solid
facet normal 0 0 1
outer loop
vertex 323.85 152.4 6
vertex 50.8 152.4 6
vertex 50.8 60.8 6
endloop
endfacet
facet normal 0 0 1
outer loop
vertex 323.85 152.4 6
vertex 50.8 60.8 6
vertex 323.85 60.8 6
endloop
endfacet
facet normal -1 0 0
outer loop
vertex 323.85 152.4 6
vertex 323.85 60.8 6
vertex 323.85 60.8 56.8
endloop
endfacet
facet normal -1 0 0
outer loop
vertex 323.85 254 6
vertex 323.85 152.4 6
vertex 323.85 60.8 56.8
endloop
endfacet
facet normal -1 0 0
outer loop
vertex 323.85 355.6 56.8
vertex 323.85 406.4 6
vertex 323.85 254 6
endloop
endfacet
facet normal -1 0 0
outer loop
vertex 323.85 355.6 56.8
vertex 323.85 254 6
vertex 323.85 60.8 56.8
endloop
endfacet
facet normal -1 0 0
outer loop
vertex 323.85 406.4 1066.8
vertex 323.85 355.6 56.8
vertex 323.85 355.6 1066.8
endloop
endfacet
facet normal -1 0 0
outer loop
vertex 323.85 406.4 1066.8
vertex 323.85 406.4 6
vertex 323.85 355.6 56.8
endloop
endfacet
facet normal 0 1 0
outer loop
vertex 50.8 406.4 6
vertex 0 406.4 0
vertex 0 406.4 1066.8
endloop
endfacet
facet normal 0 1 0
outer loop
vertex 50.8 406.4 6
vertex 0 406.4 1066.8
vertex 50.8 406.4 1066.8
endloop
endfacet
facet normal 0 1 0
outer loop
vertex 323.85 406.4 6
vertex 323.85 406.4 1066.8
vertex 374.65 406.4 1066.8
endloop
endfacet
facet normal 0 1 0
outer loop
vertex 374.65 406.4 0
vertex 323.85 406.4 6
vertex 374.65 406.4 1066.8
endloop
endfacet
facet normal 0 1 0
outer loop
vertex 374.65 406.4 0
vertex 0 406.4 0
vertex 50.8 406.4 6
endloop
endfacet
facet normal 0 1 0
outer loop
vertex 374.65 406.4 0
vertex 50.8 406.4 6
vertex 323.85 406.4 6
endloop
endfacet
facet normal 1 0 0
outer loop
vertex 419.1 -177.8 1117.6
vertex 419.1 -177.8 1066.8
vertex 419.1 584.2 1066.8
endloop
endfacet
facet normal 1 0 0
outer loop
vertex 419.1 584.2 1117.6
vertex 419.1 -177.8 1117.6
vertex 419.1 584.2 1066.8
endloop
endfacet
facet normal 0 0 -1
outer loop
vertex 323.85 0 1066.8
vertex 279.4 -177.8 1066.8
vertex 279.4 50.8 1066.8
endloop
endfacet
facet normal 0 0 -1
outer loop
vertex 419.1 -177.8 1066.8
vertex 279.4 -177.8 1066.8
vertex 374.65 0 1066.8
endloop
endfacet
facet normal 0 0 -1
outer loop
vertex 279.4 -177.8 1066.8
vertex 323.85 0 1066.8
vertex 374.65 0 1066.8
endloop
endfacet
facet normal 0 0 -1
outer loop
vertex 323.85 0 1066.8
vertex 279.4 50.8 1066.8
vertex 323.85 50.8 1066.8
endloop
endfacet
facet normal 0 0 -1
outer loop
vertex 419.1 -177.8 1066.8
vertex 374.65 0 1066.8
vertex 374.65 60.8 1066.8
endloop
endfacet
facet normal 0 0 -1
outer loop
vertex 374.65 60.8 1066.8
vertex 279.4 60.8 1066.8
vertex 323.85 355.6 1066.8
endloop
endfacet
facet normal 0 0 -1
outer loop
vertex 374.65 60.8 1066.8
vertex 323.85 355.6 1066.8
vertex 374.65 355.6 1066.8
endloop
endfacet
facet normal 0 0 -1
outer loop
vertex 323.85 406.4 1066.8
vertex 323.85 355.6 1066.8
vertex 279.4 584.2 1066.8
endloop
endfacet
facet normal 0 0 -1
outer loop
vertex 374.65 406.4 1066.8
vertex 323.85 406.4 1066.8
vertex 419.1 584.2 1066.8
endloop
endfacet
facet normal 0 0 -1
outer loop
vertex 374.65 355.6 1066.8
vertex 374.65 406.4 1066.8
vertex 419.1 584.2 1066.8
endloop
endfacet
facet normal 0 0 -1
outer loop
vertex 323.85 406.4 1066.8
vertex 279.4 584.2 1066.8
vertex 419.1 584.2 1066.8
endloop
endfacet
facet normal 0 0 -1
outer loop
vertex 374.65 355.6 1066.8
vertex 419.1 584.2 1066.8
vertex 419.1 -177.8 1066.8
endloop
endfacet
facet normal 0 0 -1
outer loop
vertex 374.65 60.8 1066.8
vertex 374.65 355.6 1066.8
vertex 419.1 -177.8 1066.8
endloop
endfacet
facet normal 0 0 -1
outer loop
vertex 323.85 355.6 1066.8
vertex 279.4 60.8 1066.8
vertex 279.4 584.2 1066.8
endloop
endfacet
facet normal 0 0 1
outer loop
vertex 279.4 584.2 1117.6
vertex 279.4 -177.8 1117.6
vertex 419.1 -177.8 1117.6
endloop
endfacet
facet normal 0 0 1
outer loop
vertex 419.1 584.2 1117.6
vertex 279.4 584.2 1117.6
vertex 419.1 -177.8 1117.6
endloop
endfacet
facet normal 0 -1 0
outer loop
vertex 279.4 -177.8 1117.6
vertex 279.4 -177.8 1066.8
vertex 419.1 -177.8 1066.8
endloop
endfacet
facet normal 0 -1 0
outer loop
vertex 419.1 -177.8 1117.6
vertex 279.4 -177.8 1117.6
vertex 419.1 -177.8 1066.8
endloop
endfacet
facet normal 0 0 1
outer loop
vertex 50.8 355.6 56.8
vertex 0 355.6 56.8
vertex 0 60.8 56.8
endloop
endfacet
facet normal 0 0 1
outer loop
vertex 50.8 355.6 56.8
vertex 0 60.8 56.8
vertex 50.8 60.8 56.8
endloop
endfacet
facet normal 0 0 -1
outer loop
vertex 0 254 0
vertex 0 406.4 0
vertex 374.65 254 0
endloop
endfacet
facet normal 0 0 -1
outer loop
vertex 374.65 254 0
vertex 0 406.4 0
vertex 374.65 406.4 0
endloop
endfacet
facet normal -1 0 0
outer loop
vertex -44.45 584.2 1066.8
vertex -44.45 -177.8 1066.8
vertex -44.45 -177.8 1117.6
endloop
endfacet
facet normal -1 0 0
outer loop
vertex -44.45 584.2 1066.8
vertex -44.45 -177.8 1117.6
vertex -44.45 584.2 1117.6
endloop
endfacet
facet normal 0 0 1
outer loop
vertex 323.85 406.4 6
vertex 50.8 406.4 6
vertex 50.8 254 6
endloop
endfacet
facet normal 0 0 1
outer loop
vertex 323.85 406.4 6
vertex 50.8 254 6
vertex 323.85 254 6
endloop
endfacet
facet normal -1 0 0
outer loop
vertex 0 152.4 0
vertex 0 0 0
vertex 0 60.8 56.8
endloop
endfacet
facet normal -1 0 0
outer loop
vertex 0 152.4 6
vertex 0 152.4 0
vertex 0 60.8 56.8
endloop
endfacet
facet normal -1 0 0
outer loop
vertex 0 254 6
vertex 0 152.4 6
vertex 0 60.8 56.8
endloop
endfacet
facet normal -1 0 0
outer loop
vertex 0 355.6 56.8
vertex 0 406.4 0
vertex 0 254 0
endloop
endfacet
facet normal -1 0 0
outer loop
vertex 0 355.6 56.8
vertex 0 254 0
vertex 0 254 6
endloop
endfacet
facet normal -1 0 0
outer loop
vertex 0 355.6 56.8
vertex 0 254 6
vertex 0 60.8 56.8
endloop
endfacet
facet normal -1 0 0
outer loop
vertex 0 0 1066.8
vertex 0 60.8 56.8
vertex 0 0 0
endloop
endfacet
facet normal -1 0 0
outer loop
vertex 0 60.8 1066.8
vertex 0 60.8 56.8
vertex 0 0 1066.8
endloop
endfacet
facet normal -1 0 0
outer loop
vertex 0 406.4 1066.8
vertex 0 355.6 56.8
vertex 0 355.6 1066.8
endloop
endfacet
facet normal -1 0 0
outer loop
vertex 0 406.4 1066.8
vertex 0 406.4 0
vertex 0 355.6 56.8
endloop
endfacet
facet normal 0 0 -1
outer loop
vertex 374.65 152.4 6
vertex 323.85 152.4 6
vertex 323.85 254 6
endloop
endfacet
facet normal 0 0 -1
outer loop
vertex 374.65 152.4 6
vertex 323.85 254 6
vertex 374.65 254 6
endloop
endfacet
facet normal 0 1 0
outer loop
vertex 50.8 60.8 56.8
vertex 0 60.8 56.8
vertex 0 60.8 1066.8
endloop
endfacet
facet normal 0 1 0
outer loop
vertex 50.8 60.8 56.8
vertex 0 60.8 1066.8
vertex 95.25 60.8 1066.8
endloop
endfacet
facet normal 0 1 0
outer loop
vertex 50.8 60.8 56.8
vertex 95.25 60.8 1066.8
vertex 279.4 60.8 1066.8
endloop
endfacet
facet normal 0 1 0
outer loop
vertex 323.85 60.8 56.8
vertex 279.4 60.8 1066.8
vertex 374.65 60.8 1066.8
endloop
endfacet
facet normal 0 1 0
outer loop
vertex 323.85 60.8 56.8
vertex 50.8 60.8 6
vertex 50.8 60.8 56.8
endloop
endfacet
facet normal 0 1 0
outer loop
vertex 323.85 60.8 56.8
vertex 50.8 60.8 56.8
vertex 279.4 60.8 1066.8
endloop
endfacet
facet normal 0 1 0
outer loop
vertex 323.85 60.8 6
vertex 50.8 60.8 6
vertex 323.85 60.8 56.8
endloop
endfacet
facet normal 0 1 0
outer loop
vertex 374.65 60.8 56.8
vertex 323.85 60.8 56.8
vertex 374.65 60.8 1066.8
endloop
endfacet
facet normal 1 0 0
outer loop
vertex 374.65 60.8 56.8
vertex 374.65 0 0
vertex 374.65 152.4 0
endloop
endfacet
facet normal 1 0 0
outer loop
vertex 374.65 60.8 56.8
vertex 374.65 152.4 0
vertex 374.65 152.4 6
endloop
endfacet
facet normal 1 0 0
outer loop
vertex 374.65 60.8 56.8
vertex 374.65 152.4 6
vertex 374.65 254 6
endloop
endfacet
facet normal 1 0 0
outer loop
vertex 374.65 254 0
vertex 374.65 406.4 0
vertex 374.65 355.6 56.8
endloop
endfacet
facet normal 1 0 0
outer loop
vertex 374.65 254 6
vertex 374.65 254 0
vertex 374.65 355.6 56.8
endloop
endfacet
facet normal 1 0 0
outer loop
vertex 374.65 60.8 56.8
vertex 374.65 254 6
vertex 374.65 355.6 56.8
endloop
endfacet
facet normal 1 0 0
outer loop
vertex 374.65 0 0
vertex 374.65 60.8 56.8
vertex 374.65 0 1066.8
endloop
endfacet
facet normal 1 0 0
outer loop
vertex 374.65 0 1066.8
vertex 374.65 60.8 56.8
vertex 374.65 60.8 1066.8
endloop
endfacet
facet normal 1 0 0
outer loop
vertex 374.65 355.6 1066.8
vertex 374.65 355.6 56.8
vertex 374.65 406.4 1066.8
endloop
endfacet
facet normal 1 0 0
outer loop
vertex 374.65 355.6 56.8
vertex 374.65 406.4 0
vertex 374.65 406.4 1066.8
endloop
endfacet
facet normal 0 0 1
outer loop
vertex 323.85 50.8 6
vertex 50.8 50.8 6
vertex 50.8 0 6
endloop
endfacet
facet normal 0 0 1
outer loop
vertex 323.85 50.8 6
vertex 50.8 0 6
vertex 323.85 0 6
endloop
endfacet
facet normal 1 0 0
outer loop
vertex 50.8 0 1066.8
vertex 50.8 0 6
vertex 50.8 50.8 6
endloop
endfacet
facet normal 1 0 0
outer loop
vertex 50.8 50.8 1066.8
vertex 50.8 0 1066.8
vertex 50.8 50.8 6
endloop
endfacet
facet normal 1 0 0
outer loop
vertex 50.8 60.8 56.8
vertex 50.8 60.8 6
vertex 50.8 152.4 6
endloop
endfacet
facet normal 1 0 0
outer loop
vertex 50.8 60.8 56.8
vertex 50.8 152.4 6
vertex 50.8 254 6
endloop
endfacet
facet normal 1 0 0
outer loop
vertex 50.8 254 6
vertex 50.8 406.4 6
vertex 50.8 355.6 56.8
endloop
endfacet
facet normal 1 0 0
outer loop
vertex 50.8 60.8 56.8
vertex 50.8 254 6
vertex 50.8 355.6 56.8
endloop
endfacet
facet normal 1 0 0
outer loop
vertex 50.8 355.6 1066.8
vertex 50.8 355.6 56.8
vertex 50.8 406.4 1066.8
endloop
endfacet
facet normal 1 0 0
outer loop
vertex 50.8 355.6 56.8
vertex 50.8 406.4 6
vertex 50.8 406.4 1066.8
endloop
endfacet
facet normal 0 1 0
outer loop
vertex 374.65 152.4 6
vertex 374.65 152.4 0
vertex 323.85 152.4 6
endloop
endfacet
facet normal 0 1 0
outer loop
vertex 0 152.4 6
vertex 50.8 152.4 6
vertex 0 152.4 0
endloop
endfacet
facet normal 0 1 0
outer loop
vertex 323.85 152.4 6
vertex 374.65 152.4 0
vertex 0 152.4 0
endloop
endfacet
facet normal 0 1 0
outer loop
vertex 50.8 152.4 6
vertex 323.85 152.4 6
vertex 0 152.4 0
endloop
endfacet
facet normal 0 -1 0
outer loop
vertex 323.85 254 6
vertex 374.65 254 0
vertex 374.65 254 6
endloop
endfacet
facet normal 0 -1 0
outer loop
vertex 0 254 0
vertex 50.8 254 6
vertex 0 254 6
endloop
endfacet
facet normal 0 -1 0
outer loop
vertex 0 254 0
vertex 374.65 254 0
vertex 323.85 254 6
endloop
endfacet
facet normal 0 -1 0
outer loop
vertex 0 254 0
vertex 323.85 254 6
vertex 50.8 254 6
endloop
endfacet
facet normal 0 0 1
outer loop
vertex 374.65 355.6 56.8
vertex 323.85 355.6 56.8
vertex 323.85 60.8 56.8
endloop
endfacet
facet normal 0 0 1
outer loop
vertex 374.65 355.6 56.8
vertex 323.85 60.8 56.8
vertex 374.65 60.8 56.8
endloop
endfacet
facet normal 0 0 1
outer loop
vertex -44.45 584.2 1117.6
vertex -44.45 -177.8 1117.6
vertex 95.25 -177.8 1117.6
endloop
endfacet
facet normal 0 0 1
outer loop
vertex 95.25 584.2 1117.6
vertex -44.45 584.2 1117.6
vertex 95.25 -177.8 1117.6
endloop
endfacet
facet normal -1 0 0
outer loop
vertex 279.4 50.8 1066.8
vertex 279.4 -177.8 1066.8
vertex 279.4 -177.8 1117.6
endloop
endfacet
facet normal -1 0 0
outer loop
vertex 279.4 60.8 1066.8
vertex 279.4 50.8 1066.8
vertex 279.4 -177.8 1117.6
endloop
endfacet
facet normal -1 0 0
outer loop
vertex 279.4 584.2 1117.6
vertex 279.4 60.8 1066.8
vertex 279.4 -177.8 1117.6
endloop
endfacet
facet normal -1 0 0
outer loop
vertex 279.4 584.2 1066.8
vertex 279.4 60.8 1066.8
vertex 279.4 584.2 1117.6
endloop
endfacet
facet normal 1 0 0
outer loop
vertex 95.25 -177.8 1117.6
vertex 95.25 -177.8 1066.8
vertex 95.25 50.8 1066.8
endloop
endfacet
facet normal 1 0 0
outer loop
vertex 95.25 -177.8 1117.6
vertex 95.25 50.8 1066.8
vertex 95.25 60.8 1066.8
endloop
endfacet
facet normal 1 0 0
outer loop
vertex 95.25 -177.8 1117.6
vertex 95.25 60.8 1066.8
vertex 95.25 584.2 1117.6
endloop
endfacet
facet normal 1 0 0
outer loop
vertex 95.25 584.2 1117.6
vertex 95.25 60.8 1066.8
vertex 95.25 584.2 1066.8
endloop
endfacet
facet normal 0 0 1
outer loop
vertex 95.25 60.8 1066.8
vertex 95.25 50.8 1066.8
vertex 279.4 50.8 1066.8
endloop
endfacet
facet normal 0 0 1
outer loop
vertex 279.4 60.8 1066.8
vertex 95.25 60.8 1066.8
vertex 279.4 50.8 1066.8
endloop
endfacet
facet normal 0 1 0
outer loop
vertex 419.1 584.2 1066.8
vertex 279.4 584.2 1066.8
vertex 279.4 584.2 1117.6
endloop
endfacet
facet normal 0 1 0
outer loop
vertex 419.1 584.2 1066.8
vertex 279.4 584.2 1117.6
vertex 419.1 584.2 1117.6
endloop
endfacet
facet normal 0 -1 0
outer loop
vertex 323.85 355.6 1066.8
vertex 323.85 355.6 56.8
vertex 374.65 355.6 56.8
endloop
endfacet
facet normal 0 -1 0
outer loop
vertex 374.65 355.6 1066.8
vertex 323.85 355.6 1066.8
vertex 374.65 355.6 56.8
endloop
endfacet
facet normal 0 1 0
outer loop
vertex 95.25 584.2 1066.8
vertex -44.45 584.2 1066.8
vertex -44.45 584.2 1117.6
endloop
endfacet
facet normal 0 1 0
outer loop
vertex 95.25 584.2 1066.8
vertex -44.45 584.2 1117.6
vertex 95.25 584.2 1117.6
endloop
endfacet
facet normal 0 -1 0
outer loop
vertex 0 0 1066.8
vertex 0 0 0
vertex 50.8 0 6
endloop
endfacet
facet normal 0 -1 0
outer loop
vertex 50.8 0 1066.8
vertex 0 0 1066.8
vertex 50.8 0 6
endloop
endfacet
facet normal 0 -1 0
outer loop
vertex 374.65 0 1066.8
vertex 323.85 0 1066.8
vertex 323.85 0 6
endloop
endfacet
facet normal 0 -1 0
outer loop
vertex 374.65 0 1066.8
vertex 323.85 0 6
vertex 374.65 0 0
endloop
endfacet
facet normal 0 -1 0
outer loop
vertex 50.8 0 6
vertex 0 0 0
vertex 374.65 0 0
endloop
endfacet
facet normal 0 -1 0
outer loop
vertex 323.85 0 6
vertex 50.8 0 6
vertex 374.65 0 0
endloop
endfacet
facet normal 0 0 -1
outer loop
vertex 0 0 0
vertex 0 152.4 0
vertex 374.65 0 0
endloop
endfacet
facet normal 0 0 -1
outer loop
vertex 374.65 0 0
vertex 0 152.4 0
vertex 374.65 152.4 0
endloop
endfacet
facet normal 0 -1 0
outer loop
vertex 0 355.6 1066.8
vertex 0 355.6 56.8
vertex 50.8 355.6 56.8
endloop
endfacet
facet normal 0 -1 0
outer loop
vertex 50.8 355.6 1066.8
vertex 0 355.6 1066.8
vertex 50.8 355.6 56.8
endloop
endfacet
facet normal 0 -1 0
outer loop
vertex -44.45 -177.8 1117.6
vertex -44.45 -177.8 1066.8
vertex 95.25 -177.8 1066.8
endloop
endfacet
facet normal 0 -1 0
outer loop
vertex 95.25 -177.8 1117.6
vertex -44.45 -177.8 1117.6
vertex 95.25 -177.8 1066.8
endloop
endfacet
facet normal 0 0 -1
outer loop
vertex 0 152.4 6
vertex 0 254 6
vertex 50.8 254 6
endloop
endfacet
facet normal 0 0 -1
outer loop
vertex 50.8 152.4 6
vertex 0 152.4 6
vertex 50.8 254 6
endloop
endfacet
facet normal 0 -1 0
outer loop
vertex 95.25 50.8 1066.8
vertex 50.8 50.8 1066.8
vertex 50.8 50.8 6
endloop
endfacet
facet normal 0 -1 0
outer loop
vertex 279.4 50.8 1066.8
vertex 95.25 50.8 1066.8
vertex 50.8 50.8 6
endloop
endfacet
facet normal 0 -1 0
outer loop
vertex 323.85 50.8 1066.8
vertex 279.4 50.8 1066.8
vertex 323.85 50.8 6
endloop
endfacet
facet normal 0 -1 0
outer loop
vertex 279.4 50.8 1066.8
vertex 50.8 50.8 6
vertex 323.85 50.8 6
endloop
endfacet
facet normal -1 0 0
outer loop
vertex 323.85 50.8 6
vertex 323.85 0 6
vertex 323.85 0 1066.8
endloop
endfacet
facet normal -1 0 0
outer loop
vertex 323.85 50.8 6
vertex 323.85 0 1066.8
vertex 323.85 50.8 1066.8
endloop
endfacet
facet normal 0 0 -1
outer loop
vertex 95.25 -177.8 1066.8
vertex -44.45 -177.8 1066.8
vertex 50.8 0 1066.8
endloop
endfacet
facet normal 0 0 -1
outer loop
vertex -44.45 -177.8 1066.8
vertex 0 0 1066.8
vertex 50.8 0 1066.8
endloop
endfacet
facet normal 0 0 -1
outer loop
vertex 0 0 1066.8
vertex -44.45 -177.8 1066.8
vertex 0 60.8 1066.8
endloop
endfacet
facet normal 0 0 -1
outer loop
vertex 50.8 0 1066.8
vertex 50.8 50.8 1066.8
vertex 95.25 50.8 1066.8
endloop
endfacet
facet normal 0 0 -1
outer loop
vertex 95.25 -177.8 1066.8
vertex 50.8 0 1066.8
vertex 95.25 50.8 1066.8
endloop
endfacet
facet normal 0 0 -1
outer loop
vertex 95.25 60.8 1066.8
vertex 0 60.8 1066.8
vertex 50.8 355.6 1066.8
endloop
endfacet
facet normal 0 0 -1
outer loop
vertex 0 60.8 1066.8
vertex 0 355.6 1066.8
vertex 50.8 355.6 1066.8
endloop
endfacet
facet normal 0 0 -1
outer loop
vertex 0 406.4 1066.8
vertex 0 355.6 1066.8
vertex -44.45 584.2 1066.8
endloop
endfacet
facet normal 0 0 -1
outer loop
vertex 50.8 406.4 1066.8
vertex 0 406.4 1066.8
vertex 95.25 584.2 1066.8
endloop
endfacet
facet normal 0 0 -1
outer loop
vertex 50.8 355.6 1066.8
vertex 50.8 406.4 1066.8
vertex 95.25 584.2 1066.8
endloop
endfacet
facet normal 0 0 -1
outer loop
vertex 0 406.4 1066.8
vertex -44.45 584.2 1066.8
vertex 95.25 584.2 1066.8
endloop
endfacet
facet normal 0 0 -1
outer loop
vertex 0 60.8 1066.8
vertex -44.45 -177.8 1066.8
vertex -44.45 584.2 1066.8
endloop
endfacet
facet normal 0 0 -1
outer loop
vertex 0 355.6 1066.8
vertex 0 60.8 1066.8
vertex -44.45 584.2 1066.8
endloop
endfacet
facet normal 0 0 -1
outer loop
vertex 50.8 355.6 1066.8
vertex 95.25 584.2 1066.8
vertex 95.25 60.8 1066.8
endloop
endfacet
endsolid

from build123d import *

# Parameters (mm, degrees)
SKETCH1_W           = 374.65
SKETCH1_H           = 406.4
BOSS_EXTRUDE1_DEPTH = 6
SKETCH1_5_W         = 50.8
SKETCH1_5_H         = 50.8
BOSS_EXTRUDE2_DEPTH = 1066.8
SKETCH3_W           = 139.7
SKETCH3_H           = 762
BOSS_EXTRUDE4_DEPTH = 50.8
SKETCH4_W           = 374.65
SKETCH4_H           = 1060.8
BOSS_EXTRUDE5_DEPTH = 10
SKETCH5_W           = 374.65
SKETCH5_H           = 101.6
CUT_EXTRUDE1_DEPTH  = 10
BOSS_EXTRUDE7_REACH = 1309.36
SKETCH6_W           = 50.8
SKETCH6_H           = 50.8


with BuildPart() as part:
    # Sketch1 → Boss-Extrude1 (new body)
    with BuildSketch(Plane.XY):
        with Locations((187.325, 203.2)):
            Rectangle(SKETCH1_W, SKETCH1_H)
    extrude(amount=BOSS_EXTRUDE1_DEPTH)

    # Sketch1<5> → Boss-Extrude2 (add)
    with BuildSketch(Plane.XY):
        with Locations((25.4, 381)):
            Rectangle(SKETCH1_5_W, SKETCH1_5_H)
        with Locations((25.4, 25.4)):
            Rectangle(SKETCH1_5_W, SKETCH1_5_H)
        with Locations((349.25, 25.4)):
            Rectangle(SKETCH1_5_W, SKETCH1_5_H)
        with Locations((349.25, 381)):
            Rectangle(SKETCH1_5_W, SKETCH1_5_H)
    extrude(amount=BOSS_EXTRUDE2_DEPTH)

    # Sketch3 → Boss-Extrude4 (add)
    with BuildSketch(Plane.XY.offset(1066.8)):
        with Locations((25.4, 203.2)):
            Rectangle(SKETCH3_W, SKETCH3_H)
        with Locations((349.25, 203.2)):
            Rectangle(SKETCH3_W, SKETCH3_H)
    extrude(amount=BOSS_EXTRUDE4_DEPTH)

    # Sketch4 → Boss-Extrude5 (add)
    with BuildSketch(Plane(origin=(0, 50.8, 0), x_dir=(1, 0, 0), z_dir=(0, 1, 0))):
        with Locations((187.325, -536.4)):
            Rectangle(SKETCH4_W, SKETCH4_H)
    extrude(amount=BOSS_EXTRUDE5_DEPTH)

    # Sketch5 → Cut-Extrude1 (cut)
    with BuildSketch(Plane(origin=(0, 0, 0), x_dir=(-1, 0, 0), z_dir=(0, 0, -1))):
        with Locations((-187.325, 203.2)):
            Rectangle(SKETCH5_W, SKETCH5_H)
    extrude(amount=-CUT_EXTRUDE1_DEPTH, mode=Mode.SUBTRACT)

    # Sketch6 → Boss-Extrude7 (add, up to next)
    with BuildSketch(Plane.XZ.offset(-355.6), mode=Mode.PRIVATE) as boss_extrude7_sk1:
        with Locations((25.4, 31.4)):
            Rectangle(SKETCH6_W, SKETCH6_H)
    boss_extrude7_tool1 = extrude(boss_extrude7_sk1.sketch, amount=BOSS_EXTRUDE7_REACH, mode=Mode.PRIVATE) - part.part
    # Sketch6 → Boss-Extrude7 (add, up to next)
    with BuildSketch(Plane.XZ.offset(-355.6), mode=Mode.PRIVATE) as boss_extrude7_sk2:
        with Locations((349.25, 31.4)):
            Rectangle(SKETCH6_W, SKETCH6_H)
    boss_extrude7_tool2 = extrude(boss_extrude7_sk2.sketch, amount=BOSS_EXTRUDE7_REACH, mode=Mode.PRIVATE) - part.part
    add(boss_extrude7_tool1.solids().sort_by_distance((25.4, 355.6, 31.4))[0])
    add(boss_extrude7_tool2.solids().sort_by_distance((349.25, 355.6, 31.4))[0])


solid = part.part
